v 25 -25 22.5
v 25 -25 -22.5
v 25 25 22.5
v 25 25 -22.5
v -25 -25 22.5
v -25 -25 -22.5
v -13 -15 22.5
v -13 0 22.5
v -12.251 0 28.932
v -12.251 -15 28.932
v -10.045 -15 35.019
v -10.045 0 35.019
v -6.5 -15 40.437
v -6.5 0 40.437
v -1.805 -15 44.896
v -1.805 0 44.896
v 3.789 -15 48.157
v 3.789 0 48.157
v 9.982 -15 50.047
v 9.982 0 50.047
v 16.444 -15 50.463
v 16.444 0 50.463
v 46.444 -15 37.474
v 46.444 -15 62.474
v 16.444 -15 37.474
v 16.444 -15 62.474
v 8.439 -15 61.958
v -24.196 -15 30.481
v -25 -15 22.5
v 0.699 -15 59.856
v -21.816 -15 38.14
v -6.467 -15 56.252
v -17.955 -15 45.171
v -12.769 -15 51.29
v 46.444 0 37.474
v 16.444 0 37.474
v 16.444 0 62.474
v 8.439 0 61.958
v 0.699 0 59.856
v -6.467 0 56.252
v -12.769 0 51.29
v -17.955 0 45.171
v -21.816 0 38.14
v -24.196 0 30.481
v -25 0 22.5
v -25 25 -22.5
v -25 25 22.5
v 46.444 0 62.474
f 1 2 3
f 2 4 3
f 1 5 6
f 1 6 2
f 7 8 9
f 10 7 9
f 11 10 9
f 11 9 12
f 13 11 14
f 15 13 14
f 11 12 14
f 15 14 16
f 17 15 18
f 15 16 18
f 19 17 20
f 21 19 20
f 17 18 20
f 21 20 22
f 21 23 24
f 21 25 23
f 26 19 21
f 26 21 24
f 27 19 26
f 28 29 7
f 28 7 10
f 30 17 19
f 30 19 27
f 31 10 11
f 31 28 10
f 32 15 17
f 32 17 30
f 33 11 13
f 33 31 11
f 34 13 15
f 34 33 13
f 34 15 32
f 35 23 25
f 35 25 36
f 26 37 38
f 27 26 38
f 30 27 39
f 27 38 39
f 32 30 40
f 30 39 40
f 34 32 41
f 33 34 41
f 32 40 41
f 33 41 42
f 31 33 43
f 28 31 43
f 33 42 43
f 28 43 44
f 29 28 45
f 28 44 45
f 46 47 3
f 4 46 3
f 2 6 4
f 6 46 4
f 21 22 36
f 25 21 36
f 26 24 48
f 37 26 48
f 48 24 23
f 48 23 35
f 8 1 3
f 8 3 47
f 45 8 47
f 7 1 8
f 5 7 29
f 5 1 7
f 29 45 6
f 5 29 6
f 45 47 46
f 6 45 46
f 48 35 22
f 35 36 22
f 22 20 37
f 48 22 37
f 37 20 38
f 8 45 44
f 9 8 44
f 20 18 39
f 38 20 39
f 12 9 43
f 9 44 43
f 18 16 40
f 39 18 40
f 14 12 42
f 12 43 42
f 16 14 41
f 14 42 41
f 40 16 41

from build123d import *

# Parameters (mm, degrees)
F1_DEPTH  = 25
F2_DEPTH  = 15
F2_FACE_W = 15
F2_FACE_H = 25
F3_DEPTH  = 10


with BuildPart() as f1:
    # F0 (on Front) → F1 (new body, symmetric)
    with BuildSketch(Plane.XZ):
        Polygon((-25, 22.5), (-25, -22.5), (25, -22.5), (25, 22.5), (-13, 22.5), align=None)
    extrude(amount=F1_DEPTH, both=True)

    # F0 (on Front) → F2 (join)
    with BuildSketch(Plane.XZ):
        Polygon((-25, 22.5), (-25, -22.5), (25, -22.5), (25, 22.5), (-13, 22.5), align=None)
        with BuildLine():
            ThreePointArc((16.44358, 62.473942), (-12.769199, 51.29013), (-25, 22.5))
            Line((-25, 22.5), (-13, 22.5))
            ThreePointArc((-13, 22.5), (-4.281853, 42.802959), (16.44358, 50.462762))
            Line((16.44358, 50.462762), (16.44358, 62.473942))
        make_face()
        Polygon((36.44358, 62.473942), (16.44358, 62.473942), (16.44358, 50.462762), (16.44358, 37.473942), (36.44358, 37.473942), align=None)
    extrude(amount=F2_DEPTH)

    # F2_face (on face) → F3 (join)
    with BuildSketch(Plane(origin=(36.44358, -7.5, 49.973942), x_dir=(0, 1, 0), z_dir=(1, 0, 0))):
        Rectangle(F2_FACE_W, F2_FACE_H)
    extrude(amount=F3_DEPTH)


solid = f1.part
